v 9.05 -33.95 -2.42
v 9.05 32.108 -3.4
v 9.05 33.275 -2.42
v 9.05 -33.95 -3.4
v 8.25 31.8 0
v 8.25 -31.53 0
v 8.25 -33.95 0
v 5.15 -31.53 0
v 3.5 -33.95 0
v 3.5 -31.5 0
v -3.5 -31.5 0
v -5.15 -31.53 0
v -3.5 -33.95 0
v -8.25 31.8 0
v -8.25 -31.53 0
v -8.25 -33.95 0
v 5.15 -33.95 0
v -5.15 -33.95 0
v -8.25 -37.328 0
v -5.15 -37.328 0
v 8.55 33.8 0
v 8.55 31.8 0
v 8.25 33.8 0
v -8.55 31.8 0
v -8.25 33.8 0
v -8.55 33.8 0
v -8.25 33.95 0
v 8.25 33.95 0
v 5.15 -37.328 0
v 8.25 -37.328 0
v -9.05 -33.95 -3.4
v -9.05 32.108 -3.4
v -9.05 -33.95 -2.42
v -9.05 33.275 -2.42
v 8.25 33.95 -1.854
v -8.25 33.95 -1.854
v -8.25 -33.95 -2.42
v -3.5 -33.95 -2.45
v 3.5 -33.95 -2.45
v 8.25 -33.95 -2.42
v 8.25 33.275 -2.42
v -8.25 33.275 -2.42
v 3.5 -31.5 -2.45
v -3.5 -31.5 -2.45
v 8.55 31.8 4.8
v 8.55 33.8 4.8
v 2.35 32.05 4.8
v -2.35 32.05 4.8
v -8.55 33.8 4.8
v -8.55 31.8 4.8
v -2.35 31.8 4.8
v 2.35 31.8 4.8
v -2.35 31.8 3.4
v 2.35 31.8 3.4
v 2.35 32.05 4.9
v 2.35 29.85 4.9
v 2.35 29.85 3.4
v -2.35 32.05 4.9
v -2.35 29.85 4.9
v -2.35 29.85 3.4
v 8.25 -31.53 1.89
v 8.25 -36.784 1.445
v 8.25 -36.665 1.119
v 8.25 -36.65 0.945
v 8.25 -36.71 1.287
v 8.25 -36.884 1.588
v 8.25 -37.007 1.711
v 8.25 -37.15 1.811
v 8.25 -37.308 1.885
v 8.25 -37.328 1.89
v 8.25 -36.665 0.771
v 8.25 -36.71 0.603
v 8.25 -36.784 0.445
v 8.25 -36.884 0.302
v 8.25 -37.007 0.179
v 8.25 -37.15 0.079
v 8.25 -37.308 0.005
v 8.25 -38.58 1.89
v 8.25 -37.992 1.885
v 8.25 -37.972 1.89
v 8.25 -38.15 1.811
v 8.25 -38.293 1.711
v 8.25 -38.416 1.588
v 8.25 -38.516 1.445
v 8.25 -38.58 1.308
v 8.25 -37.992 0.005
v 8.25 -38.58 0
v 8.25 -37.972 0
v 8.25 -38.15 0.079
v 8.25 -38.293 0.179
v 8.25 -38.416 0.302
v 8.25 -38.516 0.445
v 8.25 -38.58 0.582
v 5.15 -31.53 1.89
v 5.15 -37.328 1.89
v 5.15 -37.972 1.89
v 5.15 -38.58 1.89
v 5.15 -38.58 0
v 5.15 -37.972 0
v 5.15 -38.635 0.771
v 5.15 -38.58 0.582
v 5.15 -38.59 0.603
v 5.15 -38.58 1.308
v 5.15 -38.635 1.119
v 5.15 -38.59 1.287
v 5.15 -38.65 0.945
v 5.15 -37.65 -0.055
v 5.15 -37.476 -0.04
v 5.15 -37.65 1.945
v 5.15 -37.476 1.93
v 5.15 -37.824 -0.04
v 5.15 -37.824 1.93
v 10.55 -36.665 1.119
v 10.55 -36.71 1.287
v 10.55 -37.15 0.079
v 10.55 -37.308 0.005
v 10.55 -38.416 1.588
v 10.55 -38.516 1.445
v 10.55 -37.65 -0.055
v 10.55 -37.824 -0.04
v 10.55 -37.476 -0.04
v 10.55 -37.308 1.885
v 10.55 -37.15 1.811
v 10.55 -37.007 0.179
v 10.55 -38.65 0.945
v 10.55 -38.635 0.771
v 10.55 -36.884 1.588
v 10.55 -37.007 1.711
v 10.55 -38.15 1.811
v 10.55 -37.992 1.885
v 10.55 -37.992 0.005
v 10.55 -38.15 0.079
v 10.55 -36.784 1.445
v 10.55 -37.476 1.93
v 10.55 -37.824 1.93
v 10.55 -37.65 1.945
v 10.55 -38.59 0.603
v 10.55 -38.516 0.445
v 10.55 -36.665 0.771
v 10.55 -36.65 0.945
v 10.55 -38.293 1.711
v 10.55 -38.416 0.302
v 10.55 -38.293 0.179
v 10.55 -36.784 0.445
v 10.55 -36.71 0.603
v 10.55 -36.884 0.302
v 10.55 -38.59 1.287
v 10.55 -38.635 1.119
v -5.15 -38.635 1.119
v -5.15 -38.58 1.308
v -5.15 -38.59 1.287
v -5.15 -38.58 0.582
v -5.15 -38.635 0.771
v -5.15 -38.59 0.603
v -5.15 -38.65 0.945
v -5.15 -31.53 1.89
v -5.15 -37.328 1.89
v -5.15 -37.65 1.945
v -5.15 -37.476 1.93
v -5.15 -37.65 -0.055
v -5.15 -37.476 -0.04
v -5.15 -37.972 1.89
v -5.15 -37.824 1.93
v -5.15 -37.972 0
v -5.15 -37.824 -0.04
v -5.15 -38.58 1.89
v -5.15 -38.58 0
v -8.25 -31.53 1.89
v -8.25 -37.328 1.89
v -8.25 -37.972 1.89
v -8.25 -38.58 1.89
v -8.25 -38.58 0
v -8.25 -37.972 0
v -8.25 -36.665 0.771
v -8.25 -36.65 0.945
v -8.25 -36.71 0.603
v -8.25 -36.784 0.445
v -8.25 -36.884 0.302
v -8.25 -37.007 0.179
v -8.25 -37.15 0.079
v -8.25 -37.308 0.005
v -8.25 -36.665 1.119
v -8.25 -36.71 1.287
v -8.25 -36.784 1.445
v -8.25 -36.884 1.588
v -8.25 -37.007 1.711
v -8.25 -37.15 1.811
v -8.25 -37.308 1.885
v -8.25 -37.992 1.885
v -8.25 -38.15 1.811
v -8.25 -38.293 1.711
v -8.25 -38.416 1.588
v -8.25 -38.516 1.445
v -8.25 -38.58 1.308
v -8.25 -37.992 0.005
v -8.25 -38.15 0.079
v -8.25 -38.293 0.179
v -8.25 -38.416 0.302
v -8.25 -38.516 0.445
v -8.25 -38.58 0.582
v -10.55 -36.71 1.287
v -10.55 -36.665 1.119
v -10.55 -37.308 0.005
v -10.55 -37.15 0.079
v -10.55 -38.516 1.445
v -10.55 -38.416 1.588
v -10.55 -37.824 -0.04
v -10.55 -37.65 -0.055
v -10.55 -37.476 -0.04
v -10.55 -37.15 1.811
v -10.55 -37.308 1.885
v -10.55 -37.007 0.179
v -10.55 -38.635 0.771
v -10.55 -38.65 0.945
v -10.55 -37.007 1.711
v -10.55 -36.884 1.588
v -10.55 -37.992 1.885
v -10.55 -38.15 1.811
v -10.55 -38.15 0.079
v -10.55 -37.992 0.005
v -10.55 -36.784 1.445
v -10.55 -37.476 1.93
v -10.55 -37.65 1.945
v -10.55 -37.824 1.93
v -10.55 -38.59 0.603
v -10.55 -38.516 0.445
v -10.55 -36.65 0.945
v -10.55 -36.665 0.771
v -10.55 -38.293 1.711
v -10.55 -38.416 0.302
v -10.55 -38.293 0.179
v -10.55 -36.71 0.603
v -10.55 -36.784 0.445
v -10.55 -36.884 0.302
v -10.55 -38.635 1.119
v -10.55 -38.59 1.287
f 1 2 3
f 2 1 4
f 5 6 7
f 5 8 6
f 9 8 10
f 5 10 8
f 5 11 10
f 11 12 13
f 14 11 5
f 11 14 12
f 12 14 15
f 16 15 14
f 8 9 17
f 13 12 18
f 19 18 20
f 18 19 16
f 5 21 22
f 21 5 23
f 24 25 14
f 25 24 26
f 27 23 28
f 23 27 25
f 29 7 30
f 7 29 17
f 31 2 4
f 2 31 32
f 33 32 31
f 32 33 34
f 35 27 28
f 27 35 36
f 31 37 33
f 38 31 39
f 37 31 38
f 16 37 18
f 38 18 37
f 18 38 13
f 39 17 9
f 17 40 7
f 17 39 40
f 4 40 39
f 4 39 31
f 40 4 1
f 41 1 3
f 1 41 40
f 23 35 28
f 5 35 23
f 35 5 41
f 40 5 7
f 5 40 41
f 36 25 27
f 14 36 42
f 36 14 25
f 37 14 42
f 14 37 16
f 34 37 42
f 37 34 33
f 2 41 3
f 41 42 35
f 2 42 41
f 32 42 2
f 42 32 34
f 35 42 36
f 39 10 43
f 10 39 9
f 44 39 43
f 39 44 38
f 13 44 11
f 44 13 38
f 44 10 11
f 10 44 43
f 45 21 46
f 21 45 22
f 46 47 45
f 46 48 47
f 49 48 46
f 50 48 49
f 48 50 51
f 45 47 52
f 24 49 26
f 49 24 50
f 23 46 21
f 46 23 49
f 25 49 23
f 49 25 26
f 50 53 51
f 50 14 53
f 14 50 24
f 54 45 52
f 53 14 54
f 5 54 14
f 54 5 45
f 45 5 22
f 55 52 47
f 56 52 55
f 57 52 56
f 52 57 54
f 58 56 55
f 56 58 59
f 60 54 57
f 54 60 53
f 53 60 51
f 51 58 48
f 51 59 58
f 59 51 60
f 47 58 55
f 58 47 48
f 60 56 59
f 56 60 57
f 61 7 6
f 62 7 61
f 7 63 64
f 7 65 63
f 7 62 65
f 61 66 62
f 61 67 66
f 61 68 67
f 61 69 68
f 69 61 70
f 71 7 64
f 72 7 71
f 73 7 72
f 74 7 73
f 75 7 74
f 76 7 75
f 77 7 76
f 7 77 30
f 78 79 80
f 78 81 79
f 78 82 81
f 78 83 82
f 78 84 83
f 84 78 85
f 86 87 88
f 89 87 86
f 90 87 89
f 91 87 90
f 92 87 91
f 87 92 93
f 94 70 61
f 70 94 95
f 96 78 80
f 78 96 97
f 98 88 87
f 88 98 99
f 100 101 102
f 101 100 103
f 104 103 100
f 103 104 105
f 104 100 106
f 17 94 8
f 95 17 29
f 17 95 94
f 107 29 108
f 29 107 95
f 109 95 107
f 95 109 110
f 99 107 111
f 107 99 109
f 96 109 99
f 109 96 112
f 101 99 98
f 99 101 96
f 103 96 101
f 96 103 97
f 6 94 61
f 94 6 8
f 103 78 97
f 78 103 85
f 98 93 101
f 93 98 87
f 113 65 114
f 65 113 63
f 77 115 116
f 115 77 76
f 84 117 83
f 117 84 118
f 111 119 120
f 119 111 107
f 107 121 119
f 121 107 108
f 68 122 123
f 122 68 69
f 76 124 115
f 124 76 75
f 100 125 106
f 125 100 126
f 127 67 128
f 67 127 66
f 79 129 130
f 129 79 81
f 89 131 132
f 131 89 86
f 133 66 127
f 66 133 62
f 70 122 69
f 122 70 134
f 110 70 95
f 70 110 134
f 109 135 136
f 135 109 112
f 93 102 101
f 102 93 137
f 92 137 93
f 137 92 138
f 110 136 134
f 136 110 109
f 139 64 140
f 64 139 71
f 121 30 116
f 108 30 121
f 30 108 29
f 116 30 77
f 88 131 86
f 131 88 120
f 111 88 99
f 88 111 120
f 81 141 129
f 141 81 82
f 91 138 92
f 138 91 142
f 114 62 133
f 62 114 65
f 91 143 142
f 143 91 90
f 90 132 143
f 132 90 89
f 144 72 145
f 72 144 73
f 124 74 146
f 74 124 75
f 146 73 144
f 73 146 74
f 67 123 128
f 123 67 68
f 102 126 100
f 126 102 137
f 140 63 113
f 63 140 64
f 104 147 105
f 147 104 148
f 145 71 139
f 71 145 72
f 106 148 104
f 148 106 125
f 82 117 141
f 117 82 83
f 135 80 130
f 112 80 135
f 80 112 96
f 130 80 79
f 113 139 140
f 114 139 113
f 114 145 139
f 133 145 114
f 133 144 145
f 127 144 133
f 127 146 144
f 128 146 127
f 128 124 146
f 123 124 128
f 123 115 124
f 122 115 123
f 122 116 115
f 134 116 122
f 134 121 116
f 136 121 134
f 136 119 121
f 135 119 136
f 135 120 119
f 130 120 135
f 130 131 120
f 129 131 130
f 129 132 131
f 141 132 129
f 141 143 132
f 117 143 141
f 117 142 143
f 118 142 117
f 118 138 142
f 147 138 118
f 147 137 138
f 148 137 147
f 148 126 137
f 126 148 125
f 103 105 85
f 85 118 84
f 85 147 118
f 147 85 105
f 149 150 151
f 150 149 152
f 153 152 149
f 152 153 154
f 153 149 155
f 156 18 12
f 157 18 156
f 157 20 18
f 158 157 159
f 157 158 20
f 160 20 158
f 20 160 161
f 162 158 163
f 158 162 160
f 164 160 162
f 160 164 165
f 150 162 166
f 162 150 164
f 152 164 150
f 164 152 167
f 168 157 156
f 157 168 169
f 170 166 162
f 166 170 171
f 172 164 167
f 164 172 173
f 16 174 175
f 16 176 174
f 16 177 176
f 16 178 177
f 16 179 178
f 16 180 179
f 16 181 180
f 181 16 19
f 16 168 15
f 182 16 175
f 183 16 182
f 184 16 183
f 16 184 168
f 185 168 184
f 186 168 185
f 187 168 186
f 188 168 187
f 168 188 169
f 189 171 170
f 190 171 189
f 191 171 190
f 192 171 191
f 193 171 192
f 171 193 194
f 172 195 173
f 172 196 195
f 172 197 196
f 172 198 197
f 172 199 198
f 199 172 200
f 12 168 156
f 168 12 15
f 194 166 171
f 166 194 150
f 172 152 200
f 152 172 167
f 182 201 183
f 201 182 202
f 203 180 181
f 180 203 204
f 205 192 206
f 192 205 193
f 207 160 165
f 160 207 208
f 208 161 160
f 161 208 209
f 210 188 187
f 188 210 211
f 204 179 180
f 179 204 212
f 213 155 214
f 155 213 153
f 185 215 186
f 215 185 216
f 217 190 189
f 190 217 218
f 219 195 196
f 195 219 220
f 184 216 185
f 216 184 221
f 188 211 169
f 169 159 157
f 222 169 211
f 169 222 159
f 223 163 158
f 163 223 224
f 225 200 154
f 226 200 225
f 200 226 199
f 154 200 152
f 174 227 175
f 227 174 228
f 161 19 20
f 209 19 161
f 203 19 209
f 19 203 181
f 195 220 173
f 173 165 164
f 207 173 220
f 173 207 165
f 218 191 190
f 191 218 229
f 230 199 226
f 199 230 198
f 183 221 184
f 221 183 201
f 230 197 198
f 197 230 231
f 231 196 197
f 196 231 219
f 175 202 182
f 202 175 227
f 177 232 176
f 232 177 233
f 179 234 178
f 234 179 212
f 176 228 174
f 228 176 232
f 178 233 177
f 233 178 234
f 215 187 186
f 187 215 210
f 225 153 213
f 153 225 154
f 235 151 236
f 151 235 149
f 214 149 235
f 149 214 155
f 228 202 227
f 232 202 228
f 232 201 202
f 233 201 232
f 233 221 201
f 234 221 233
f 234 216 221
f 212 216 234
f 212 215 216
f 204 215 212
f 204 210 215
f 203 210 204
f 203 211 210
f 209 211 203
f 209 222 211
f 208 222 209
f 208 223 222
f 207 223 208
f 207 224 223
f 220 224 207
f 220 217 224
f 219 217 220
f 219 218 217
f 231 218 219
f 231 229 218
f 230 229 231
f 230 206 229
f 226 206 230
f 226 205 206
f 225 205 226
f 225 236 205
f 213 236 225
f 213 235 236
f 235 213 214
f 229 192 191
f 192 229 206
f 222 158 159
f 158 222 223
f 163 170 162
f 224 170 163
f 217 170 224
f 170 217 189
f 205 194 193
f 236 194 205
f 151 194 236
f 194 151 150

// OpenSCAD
cover_width  = 18.1;//盖子宽度
cover_length = 67.9;//盖子总长（除去小耳朵）
cover_h = 4.3;//盖子是斜面，这里是最厚的地方
cover_h2 = 3.4;//
cover_interal_length = 65.2;//盖子内部总长
clip_w = 4.7;//盖子上大卡扣的宽度
clip_h = 1.5;//盖子上大卡扣的厚度
clip_deep=2.2;//盖子上大卡扣的深度
difference()
{
translate([0, 0, -cover_h2/2]) 
cube(size=[cover_width, cover_length, cover_h2], center=true);
translate([cover_width/2-0.4, 0, -(2.42)/2]) 
cube(size=[0.8, 100, 2.42], center=true);
translate([-cover_width/2+0.4, 0, -(2.42)/2]) 
cube(size=[0.8, 100, 2.42], center=true);

translate([0, 35, -7.5]) 
rotate([40, 0, 0]) 
cube(size=[100, 10, 10], center=true);
translate([0, -33, -1.2])
cube(size=[7, 3, 2.5], center=true); 
}//主题
translate([0, 0.2, 0]) {
    union()
{
translate([0, cover_length/2-(cover_length-cover_interal_length)/2, 4.8/2]) 
cube(size=[cover_width-1, 2, 4.8], center=true);

translate([0, cover_length/2-3.2  , clip_h/2+cover_h2]) 
cube(size=[clip_w, clip_deep, clip_h], center=true);

}
}


translate([-0.8, 0, 0]) 
{
    translate([(cover_width-3.1)/2, -(cover_length+4.63-2.42)/2, 1.89/2]) 
cube(size=[3.1, 4.63+2.42, 1.89], center=true);
translate([(cover_width+5.4)/2-3.1, -(cover_length+7.4)/2, 1.89/2]) 
rotate([0, 90, 0]) {
    cylinder(r=1, h=5.4, center=true,$fn=36);
}
}

translate([0.8, 0, 0]) 
{
    translate([-(cover_width-3.1)/2, -(cover_length+4.63-2.42)/2, 1.89/2]) 
cube(size=[3.1, 4.63+2.42, 1.89], center=true);
translate([-(cover_width+5.4)/2+3.1, -(cover_length+7.4)/2, 1.89/2]) 
rotate([0, 90, 0]) {
    cylinder(r=1, h=5.4, center=true,$fn=36);
}
}
